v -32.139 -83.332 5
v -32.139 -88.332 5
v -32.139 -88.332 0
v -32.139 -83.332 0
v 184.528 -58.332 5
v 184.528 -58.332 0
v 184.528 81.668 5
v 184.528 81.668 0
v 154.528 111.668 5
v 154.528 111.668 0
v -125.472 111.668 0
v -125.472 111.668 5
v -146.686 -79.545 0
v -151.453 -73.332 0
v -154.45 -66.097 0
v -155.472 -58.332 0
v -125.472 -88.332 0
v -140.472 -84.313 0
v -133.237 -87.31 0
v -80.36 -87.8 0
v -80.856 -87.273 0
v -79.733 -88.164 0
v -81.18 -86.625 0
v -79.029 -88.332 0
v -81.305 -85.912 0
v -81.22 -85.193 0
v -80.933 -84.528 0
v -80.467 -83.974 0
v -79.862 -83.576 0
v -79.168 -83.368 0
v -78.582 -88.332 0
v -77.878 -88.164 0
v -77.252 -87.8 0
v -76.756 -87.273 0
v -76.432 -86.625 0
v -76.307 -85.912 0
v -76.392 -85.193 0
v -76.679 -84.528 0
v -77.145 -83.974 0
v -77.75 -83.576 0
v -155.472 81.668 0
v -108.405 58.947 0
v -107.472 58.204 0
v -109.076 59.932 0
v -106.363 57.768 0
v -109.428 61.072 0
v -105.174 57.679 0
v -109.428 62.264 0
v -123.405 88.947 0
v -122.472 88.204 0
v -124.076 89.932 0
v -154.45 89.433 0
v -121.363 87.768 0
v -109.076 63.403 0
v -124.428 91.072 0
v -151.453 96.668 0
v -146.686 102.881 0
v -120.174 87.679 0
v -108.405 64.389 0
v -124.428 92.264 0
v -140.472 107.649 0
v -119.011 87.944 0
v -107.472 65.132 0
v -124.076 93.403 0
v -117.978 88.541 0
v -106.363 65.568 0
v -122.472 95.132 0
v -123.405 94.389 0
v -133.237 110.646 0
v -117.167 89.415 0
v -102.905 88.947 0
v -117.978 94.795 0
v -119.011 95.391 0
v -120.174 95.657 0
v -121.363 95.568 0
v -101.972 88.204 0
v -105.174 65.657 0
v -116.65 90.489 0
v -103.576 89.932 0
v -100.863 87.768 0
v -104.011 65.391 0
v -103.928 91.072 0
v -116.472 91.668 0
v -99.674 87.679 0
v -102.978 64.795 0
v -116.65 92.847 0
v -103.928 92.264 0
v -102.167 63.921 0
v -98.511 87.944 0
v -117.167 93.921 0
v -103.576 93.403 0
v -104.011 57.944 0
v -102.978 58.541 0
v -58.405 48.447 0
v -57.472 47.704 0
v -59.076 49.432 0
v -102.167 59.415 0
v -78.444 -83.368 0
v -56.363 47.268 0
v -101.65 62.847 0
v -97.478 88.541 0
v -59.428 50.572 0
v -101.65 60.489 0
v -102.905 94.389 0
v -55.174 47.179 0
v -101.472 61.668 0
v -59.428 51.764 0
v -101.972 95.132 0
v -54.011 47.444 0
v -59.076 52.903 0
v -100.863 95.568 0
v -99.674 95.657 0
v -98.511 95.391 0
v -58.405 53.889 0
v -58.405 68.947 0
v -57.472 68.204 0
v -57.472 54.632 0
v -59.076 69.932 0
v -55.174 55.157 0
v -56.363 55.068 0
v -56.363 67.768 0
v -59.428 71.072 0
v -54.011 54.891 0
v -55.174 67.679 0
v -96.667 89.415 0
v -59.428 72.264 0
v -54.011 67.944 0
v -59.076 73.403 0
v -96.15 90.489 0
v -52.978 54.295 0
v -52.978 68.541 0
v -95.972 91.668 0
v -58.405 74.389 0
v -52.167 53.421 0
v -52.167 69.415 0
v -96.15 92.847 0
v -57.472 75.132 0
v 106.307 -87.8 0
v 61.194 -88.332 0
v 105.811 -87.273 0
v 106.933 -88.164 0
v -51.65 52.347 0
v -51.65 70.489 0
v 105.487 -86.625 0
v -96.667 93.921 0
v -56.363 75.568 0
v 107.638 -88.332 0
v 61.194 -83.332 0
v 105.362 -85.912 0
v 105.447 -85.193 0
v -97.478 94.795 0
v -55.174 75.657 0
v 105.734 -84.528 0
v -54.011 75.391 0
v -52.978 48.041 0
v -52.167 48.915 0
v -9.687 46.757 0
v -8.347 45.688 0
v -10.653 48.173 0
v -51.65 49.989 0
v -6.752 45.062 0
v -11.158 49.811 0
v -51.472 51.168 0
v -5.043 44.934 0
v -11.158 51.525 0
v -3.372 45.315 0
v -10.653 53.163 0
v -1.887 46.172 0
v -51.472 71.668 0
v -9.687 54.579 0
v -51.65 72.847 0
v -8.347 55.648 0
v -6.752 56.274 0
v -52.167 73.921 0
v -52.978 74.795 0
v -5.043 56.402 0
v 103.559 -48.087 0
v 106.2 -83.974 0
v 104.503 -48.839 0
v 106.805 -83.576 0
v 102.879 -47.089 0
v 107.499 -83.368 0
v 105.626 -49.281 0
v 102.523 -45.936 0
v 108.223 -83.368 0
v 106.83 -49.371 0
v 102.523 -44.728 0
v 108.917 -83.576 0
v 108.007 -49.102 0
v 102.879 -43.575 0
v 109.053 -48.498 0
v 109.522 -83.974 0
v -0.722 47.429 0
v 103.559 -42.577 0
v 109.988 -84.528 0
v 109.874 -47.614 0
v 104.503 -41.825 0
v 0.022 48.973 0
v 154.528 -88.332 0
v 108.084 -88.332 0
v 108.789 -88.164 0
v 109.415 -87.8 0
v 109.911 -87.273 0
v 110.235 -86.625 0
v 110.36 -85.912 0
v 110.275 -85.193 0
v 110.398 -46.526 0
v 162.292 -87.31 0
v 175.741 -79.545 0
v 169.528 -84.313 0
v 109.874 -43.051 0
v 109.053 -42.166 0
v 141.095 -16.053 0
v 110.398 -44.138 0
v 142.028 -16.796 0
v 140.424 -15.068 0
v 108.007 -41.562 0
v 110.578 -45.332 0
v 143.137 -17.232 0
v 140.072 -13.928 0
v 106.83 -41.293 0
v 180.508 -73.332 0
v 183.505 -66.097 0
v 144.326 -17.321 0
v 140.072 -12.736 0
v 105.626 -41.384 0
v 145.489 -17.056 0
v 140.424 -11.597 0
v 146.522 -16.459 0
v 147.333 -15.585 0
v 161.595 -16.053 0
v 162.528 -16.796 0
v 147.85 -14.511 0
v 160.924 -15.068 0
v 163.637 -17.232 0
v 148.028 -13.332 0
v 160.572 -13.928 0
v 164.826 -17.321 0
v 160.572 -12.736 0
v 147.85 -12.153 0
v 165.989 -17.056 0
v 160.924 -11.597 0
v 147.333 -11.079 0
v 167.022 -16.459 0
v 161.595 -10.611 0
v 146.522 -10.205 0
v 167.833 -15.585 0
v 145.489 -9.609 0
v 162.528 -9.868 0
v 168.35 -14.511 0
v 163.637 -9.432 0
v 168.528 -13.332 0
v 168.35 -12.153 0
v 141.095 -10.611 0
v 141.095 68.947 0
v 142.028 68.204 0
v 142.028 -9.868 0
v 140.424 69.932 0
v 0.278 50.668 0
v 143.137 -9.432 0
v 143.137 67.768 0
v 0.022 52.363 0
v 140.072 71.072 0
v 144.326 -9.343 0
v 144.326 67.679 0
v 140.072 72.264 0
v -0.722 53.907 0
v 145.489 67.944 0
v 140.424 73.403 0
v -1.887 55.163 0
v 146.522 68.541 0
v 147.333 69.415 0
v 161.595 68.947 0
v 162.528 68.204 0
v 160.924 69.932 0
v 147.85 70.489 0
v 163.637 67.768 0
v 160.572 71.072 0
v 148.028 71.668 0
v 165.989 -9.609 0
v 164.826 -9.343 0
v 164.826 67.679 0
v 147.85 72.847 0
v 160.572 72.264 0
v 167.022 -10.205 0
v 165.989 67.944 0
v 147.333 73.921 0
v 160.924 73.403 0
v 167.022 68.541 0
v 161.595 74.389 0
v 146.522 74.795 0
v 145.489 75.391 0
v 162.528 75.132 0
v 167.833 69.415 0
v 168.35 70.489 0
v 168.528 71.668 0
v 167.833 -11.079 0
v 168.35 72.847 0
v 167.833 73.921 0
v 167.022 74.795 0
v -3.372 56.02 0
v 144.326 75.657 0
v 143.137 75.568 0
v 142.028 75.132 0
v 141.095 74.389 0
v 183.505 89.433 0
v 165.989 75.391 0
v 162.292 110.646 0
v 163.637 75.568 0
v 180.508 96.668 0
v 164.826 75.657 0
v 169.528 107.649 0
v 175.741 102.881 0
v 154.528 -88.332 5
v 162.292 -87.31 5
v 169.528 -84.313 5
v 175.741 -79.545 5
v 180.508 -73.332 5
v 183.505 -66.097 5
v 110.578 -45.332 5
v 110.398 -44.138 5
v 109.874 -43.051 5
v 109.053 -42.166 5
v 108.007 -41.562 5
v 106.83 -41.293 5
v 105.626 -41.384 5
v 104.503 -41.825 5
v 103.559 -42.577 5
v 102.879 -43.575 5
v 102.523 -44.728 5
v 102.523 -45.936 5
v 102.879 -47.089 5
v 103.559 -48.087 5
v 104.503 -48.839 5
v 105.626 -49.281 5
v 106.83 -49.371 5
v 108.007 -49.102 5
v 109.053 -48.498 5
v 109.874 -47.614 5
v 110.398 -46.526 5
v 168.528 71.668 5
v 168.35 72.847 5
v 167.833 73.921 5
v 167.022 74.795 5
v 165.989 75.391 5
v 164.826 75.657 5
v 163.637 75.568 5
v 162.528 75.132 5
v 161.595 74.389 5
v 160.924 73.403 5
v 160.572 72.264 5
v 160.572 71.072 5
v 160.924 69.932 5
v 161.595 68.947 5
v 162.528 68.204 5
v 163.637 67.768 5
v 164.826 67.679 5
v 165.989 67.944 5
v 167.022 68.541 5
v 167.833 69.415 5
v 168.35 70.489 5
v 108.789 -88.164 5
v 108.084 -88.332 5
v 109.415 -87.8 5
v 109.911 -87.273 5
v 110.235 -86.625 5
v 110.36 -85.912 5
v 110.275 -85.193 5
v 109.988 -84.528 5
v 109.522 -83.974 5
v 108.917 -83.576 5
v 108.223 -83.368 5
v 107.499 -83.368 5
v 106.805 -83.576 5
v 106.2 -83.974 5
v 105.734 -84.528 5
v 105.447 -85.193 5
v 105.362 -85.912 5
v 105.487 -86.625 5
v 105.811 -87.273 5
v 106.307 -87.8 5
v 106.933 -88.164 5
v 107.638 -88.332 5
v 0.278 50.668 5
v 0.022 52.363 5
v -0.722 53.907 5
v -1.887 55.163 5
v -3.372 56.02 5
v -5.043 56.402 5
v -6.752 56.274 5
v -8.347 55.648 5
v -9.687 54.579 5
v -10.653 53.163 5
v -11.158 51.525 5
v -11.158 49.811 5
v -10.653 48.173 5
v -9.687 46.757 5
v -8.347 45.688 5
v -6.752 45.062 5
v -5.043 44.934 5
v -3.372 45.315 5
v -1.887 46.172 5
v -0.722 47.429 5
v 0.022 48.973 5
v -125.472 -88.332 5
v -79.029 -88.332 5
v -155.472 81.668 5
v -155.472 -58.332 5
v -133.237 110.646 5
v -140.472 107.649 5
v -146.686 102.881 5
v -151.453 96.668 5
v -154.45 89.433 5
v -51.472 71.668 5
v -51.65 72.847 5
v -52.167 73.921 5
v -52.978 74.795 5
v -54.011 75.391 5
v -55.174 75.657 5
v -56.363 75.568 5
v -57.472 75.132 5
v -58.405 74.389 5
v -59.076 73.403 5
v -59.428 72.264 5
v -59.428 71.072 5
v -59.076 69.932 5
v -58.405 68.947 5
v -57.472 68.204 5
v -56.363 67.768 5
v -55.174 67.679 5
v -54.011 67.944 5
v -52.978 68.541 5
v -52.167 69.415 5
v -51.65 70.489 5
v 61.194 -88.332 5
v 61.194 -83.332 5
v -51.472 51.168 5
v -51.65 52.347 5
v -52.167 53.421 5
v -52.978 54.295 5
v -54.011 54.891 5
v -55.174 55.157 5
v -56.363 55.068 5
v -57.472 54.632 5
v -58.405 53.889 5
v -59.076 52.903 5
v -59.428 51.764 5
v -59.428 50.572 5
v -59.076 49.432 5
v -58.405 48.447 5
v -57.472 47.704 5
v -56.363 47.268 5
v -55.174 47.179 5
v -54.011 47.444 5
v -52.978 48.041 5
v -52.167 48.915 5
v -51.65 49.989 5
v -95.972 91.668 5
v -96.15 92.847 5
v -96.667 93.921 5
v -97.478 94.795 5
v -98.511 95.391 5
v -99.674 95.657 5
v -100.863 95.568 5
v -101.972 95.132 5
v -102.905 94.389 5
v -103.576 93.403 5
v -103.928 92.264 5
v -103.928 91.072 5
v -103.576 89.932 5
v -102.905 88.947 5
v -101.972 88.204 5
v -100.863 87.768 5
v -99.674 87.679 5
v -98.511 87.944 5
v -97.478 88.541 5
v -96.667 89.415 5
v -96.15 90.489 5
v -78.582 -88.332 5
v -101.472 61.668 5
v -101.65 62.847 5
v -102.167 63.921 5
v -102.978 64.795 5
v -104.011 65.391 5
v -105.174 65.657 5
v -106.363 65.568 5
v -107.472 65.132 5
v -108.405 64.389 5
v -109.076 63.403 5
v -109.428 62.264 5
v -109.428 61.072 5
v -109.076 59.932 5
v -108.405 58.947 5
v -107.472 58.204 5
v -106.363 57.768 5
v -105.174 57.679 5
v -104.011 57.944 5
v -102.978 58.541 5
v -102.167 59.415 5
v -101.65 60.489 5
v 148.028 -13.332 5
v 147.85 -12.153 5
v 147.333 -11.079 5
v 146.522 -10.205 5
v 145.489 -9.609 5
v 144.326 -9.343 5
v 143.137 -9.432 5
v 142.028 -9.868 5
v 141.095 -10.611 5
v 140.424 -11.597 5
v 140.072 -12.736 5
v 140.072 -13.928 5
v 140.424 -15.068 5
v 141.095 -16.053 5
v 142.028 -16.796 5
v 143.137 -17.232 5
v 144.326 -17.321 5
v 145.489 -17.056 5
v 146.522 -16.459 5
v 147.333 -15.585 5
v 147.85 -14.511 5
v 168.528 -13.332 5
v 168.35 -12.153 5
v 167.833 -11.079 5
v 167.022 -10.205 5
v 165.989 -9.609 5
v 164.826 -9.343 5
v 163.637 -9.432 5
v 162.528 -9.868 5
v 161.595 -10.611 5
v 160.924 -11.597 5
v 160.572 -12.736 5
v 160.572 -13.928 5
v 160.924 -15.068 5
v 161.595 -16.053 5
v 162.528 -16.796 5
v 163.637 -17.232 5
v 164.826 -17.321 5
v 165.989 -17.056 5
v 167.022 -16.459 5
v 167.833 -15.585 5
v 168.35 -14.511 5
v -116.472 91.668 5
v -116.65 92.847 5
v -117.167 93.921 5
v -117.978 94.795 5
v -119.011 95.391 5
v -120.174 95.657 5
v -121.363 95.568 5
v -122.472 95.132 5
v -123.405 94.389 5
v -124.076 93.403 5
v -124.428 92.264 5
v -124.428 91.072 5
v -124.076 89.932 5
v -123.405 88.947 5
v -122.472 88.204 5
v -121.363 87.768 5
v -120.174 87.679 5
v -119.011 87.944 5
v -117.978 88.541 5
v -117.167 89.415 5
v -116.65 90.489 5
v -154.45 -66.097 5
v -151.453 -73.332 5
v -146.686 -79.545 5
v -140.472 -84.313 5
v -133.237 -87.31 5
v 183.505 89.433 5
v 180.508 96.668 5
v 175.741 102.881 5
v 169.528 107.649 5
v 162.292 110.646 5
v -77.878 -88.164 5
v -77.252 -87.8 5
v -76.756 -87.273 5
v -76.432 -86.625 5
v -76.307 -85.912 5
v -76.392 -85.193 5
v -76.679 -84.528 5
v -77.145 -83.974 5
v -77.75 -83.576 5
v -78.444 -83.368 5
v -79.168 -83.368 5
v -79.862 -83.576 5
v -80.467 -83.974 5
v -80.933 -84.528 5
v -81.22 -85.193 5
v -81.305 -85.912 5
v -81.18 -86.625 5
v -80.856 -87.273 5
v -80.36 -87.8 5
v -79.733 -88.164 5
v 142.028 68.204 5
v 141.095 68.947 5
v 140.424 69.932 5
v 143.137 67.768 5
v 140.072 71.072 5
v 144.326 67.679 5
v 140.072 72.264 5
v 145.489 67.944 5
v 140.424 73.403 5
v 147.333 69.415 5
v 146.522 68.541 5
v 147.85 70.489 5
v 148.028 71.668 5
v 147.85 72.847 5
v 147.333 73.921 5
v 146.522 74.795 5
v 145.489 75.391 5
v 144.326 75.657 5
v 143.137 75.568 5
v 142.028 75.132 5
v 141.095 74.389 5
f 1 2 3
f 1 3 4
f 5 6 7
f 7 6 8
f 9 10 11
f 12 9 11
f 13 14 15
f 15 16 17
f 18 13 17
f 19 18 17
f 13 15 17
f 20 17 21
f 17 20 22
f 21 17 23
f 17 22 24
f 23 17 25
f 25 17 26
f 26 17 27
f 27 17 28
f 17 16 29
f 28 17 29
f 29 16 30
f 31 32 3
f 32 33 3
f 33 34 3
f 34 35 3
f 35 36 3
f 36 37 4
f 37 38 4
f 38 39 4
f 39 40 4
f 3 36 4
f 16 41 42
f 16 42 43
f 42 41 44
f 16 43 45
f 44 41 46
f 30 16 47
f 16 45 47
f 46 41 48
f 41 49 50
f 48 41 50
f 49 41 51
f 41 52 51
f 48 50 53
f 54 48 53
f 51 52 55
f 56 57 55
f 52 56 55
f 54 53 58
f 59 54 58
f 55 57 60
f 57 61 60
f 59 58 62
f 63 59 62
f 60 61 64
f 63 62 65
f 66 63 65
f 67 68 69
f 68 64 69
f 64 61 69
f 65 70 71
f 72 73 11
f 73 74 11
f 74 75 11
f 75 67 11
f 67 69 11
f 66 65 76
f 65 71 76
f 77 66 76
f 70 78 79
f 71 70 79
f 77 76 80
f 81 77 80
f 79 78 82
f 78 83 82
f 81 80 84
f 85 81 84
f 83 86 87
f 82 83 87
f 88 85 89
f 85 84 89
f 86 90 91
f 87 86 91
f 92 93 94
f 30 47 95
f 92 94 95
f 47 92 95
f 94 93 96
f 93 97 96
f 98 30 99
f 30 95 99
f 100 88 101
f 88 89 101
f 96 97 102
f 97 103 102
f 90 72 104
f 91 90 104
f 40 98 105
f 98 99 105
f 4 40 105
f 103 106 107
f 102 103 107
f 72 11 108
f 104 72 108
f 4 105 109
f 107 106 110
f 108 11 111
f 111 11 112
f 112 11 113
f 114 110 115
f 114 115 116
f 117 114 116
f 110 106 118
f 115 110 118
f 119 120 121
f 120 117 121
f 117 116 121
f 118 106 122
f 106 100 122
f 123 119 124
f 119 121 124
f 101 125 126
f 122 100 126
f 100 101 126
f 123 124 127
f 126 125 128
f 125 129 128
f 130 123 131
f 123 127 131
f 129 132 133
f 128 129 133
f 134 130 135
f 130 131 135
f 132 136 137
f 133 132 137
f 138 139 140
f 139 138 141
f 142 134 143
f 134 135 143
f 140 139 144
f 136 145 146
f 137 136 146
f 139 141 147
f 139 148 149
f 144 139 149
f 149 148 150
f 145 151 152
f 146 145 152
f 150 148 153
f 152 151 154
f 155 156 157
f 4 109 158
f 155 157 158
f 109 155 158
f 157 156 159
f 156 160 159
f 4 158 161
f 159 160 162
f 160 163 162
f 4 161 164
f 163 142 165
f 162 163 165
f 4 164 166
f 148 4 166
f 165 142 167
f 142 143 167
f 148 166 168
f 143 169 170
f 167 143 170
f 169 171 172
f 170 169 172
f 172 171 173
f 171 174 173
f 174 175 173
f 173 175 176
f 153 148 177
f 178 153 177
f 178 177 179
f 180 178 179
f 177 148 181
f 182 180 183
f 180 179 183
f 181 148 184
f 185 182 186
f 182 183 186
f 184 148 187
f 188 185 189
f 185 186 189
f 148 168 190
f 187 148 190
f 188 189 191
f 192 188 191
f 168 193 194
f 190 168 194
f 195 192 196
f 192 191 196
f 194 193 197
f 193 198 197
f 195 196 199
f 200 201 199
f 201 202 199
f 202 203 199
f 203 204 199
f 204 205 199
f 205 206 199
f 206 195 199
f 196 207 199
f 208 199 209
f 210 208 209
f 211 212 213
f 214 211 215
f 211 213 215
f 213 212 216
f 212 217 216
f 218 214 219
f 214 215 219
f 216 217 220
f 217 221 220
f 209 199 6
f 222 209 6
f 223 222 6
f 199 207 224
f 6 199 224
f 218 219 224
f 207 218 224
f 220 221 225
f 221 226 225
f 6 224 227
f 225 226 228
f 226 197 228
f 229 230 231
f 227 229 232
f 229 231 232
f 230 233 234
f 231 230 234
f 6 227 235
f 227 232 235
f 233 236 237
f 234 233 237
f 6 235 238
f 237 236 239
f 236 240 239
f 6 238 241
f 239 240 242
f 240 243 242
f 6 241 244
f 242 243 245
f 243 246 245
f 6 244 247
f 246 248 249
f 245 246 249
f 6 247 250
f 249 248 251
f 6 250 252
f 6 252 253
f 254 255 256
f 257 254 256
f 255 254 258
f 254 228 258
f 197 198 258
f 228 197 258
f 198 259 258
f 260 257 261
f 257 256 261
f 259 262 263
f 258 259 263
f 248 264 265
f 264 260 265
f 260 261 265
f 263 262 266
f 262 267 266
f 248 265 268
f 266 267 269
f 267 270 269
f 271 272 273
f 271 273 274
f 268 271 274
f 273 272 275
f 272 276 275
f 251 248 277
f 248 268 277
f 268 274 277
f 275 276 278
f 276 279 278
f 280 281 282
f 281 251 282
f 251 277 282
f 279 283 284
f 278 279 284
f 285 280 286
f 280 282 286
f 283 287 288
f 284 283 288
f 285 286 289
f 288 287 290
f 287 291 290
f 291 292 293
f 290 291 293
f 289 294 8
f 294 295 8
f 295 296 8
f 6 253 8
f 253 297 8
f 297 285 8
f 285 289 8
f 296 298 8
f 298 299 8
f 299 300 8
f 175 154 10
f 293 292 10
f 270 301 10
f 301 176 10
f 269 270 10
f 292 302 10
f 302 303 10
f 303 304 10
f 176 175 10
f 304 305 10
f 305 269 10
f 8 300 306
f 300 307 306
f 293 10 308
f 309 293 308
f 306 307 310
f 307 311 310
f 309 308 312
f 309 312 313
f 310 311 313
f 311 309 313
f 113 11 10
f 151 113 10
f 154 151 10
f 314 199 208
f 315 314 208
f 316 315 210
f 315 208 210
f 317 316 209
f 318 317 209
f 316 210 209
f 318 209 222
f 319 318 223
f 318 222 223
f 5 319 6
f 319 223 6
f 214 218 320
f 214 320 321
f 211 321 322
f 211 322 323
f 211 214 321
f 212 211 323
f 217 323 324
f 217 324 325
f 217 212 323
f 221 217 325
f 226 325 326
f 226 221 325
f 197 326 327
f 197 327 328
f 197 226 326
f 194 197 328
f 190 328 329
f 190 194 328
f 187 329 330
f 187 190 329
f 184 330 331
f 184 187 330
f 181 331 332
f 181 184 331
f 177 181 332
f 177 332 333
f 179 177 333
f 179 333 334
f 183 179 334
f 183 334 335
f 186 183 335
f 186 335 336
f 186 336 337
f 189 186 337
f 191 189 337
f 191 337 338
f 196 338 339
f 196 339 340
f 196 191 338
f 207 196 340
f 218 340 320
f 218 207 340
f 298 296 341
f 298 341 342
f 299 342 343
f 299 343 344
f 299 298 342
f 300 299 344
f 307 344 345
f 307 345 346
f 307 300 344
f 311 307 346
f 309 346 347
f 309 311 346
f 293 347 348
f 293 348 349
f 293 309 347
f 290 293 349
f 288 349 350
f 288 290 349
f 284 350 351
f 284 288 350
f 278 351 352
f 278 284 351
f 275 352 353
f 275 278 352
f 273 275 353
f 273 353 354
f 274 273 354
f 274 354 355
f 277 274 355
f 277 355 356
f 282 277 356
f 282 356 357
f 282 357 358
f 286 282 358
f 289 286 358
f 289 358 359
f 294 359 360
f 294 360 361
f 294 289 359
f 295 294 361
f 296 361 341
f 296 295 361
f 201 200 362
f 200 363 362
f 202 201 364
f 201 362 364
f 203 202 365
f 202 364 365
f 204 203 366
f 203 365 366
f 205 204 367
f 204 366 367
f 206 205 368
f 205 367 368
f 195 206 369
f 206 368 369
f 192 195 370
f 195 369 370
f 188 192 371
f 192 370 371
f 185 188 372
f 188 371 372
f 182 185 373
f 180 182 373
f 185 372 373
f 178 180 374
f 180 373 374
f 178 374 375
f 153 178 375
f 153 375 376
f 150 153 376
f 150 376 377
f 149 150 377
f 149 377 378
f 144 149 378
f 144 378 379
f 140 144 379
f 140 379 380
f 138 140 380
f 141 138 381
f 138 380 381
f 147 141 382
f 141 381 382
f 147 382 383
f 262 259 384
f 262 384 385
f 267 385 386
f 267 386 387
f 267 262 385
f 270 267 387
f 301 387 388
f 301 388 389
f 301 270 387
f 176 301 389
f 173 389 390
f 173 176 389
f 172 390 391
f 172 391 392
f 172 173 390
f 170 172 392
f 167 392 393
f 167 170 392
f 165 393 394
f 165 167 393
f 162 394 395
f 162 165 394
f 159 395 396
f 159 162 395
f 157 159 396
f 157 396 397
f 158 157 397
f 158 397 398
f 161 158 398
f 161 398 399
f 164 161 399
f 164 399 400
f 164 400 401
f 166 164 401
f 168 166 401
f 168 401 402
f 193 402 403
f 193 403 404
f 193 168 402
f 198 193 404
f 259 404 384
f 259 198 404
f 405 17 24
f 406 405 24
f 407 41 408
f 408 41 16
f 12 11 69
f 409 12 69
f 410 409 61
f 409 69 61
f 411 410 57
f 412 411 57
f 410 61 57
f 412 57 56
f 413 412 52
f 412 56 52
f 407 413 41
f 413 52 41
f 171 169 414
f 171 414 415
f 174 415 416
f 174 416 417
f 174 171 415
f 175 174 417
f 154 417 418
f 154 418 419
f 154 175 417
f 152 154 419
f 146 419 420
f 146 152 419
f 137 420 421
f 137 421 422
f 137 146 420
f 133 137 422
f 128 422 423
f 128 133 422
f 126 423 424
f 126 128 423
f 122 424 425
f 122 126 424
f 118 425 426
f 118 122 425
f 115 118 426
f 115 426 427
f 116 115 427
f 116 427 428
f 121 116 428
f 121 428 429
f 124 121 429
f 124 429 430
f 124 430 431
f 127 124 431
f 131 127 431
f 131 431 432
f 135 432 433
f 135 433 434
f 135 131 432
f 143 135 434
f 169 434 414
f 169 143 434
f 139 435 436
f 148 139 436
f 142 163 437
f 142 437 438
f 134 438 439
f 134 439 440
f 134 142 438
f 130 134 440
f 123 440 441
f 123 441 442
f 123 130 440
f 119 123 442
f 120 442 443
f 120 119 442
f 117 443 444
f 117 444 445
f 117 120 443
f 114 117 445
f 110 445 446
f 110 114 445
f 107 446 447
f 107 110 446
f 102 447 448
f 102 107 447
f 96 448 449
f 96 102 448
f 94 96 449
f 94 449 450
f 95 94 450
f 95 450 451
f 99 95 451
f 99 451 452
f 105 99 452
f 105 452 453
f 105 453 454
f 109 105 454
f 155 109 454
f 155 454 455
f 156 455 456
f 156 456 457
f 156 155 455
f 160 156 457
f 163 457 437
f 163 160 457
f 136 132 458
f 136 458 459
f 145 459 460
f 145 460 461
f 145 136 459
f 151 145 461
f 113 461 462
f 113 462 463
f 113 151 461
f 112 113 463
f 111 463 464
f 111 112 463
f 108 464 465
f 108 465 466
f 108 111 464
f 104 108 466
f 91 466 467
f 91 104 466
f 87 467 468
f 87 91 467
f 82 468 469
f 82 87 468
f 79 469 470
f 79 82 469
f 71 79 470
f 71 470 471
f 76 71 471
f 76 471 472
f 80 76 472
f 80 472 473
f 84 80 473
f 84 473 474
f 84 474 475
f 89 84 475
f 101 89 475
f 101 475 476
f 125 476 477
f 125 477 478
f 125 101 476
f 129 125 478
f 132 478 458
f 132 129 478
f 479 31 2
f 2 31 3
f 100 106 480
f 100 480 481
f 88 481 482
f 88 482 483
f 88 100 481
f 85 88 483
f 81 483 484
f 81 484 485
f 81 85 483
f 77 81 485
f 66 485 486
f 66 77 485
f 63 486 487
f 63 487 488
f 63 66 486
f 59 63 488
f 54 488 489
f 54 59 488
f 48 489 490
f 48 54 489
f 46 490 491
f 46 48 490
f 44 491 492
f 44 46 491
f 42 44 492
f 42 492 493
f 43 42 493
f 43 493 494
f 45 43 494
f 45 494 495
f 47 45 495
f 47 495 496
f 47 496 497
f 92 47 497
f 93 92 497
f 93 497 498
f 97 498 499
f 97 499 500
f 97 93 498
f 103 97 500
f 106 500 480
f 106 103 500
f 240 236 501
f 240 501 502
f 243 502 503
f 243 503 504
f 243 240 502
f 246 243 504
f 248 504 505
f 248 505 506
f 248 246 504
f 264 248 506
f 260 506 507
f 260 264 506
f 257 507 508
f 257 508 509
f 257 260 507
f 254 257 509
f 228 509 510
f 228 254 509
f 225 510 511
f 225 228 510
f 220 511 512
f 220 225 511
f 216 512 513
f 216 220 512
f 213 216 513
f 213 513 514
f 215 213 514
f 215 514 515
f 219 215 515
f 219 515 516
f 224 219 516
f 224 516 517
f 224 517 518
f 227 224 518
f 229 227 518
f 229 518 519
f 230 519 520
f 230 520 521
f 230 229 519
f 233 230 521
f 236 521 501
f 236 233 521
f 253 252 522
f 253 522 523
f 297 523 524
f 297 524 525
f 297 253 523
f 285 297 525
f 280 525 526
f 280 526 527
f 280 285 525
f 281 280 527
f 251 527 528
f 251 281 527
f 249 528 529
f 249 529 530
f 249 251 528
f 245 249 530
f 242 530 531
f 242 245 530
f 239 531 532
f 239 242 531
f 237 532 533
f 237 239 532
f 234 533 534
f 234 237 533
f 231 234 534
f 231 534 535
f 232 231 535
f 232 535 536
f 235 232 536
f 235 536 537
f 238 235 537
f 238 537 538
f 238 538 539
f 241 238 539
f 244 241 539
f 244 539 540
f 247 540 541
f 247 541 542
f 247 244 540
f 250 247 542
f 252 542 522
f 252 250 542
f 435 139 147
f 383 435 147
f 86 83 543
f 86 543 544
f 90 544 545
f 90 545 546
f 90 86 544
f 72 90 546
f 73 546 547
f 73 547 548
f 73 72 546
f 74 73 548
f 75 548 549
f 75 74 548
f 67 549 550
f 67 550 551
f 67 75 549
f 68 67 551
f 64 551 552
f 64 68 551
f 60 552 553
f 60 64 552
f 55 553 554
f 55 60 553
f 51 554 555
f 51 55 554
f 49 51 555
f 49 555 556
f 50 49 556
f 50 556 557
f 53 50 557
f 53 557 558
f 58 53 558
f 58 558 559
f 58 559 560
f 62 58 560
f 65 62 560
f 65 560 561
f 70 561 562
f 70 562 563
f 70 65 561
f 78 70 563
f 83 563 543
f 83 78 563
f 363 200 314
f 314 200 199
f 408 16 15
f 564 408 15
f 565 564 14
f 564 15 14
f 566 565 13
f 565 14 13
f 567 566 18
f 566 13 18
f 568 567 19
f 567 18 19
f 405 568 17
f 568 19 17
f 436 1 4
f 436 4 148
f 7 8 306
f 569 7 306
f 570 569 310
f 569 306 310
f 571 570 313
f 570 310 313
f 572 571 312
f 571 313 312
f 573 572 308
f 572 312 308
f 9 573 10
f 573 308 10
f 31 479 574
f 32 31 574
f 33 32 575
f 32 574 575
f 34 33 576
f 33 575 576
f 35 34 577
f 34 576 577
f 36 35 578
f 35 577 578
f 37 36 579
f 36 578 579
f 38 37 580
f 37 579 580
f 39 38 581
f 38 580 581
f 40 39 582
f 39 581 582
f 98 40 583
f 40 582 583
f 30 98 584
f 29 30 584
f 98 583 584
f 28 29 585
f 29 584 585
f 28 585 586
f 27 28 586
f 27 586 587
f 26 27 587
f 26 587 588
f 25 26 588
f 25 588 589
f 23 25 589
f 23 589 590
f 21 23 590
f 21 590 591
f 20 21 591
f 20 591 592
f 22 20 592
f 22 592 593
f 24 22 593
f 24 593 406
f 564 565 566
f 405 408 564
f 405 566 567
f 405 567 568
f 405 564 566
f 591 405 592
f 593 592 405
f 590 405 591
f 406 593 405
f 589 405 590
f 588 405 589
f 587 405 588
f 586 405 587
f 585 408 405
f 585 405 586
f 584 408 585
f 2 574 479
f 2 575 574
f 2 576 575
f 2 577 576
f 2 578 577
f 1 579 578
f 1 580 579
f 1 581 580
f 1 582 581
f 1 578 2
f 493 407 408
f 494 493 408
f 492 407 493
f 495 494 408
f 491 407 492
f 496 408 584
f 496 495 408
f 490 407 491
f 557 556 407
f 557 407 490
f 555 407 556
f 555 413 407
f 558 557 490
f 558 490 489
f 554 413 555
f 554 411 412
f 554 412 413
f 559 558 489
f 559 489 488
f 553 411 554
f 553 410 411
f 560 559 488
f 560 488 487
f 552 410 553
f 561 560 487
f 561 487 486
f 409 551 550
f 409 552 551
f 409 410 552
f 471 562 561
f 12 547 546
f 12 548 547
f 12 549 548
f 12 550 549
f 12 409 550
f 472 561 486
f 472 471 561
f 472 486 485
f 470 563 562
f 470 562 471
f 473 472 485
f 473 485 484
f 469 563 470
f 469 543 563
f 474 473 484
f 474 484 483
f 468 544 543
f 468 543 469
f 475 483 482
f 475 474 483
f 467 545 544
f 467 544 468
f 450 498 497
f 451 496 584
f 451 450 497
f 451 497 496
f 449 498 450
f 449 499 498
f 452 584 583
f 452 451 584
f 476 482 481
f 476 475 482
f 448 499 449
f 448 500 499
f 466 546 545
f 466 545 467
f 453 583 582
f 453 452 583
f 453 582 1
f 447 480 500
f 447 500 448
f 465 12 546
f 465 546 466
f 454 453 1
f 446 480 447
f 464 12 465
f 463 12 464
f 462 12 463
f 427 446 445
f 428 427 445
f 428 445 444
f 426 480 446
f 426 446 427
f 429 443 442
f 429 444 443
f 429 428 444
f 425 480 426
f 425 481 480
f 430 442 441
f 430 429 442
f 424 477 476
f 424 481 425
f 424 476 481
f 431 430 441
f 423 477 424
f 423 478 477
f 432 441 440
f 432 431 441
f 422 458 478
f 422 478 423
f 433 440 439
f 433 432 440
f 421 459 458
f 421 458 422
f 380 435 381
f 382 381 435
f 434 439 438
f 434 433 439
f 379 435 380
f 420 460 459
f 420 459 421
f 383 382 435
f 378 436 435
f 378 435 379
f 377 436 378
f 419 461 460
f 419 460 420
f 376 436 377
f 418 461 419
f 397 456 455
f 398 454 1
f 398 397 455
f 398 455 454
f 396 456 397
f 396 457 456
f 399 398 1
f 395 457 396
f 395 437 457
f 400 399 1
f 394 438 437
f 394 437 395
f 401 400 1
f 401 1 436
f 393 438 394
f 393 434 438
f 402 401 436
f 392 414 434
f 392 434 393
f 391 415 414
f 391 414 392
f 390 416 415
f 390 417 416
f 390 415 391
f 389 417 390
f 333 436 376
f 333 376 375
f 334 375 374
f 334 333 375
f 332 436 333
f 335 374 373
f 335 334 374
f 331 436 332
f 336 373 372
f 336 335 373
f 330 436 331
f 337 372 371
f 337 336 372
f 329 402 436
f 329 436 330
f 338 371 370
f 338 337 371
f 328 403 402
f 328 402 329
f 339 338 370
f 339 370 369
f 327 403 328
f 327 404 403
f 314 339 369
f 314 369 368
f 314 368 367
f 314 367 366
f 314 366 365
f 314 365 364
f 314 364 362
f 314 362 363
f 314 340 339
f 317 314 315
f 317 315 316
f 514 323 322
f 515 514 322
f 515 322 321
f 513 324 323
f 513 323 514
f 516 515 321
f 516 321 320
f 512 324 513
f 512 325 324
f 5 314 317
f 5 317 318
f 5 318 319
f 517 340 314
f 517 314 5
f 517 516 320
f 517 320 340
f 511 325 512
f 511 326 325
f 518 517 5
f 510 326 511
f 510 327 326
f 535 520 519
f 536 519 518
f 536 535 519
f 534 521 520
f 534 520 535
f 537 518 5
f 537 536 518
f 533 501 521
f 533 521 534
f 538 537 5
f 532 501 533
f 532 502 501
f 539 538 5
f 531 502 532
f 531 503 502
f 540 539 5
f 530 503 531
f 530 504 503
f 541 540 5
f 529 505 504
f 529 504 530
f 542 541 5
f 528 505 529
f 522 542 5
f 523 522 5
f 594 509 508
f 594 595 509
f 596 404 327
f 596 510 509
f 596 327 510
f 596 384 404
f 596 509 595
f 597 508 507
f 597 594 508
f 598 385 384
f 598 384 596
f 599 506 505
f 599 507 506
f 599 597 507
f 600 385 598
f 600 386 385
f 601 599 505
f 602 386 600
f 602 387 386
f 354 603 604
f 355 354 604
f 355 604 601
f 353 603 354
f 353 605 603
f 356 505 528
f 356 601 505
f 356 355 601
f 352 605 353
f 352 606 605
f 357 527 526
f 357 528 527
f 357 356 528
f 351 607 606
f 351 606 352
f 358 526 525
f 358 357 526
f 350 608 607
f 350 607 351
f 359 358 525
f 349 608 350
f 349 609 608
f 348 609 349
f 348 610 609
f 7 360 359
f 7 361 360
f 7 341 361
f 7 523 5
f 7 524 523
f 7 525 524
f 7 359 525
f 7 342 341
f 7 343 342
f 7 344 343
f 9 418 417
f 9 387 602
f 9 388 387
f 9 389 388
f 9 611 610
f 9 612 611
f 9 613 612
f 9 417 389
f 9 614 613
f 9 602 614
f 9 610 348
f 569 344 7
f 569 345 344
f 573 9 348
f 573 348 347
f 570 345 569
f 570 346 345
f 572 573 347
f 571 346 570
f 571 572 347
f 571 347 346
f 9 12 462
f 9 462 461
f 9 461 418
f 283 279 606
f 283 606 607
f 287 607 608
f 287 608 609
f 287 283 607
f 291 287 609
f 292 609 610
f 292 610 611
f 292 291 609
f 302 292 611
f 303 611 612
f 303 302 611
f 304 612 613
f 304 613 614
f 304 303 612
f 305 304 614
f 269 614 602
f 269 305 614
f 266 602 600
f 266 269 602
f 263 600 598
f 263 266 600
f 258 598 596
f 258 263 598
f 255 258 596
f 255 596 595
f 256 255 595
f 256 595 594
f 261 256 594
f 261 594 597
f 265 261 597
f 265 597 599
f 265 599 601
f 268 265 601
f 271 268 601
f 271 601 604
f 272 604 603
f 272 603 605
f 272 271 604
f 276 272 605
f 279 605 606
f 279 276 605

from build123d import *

# Parameters (mm, degrees)
CROQUIS1_R              = 4
CROQUIS1_R_2            = 5.75
CROQUIS1_R_3            = 4.05
SALIENTE_EXTRUIR1_DEPTH = 5
CROQUIS3_W              = 93.333333333
CROQUIS3_H              = 5
CORTAR_EXTRUIR1_DEPTH   = 10
CROQUIS6_R              = 2.5
CORTAR_EXTRUIR2_DEPTH   = 10


with BuildPart() as part:
    # Croquis1 → Saliente-Extruir1 (new body)
    with BuildSketch(Plane.XY):
        with BuildLine():
            Line((-125.472429705, -88.332065653), (154.527570295, -88.332065653))
            ThreePointArc((154.527570295, -88.332065653), (175.740773731, -79.545269088), (184.527570295, -58.332065653))
            Line((184.527570295, -58.332065653), (184.527570295, 81.667934347))
            ThreePointArc((184.527570295, 81.667934347), (175.740773731, 102.881137783), (154.527570295, 111.667934347))
            Line((154.527570295, 111.667934347), (-125.472429705, 111.667934347))
            ThreePointArc((-125.472429705, 111.667934347), (-146.68563314, 102.881137783), (-155.472429705, 81.667934347))
            Line((-155.472429705, 81.667934347), (-155.472429705, -58.332065653))
            ThreePointArc((-155.472429705, -58.332065653), (-146.68563314, -79.545269088), (-125.472429705, -88.332065653))
        make_face()
        with Locations((-105.472429705, 61.667934347)):
            Circle(CROQUIS1_R, mode=Mode.SUBTRACT)
        with Locations((-55.472429705, 71.667934347)):
            Circle(CROQUIS1_R, mode=Mode.SUBTRACT)
        with Locations((-55.472429705, 51.167934347)):
            Circle(CROQUIS1_R, mode=Mode.SUBTRACT)
        with Locations((144.027570295, -13.332065653)):
            Circle(CROQUIS1_R, mode=Mode.SUBTRACT)
        with Locations((164.527570295, -13.332065653)):
            Circle(CROQUIS1_R, mode=Mode.SUBTRACT)
        with Locations((144.027570295, 71.667934347)):
            Circle(CROQUIS1_R, mode=Mode.SUBTRACT)
        with Locations((164.527570295, 71.667934347)):
            Circle(CROQUIS1_R, mode=Mode.SUBTRACT)
        with Locations((-99.972429705, 91.667934347)):
            Circle(CROQUIS1_R, mode=Mode.SUBTRACT)
        with Locations((-120.472429705, 91.667934347)):
            Circle(CROQUIS1_R, mode=Mode.SUBTRACT)
        with Locations((-5.472429705, 50.667934347)):
            Circle(CROQUIS1_R_2, mode=Mode.SUBTRACT)
        with Locations((106.527570295, -45.332065653)):
            Circle(CROQUIS1_R_3, mode=Mode.SUBTRACT)
    extrude(amount=SALIENTE_EXTRUIR1_DEPTH)

    # Croquis3 → Cortar-Extruir1 (cut)
    with BuildSketch(Plane.XY.offset(5)):
        with Locations((14.527570296, -85.832065653)):
            Rectangle(CROQUIS3_W, CROQUIS3_H)
    extrude(amount=-CORTAR_EXTRUIR1_DEPTH, mode=Mode.SUBTRACT)

    # Croquis6 → Cortar-Extruir2 (cut)
    with BuildSketch(Plane.XY.offset(5)):
        with Locations((-78.805763038, -85.842065653)):
            Circle(CROQUIS6_R)
        with Locations((107.860903629, -85.842065653)):
            Circle(CROQUIS6_R)
    extrude(amount=-CORTAR_EXTRUIR2_DEPTH, mode=Mode.SUBTRACT)


solid = part.part
